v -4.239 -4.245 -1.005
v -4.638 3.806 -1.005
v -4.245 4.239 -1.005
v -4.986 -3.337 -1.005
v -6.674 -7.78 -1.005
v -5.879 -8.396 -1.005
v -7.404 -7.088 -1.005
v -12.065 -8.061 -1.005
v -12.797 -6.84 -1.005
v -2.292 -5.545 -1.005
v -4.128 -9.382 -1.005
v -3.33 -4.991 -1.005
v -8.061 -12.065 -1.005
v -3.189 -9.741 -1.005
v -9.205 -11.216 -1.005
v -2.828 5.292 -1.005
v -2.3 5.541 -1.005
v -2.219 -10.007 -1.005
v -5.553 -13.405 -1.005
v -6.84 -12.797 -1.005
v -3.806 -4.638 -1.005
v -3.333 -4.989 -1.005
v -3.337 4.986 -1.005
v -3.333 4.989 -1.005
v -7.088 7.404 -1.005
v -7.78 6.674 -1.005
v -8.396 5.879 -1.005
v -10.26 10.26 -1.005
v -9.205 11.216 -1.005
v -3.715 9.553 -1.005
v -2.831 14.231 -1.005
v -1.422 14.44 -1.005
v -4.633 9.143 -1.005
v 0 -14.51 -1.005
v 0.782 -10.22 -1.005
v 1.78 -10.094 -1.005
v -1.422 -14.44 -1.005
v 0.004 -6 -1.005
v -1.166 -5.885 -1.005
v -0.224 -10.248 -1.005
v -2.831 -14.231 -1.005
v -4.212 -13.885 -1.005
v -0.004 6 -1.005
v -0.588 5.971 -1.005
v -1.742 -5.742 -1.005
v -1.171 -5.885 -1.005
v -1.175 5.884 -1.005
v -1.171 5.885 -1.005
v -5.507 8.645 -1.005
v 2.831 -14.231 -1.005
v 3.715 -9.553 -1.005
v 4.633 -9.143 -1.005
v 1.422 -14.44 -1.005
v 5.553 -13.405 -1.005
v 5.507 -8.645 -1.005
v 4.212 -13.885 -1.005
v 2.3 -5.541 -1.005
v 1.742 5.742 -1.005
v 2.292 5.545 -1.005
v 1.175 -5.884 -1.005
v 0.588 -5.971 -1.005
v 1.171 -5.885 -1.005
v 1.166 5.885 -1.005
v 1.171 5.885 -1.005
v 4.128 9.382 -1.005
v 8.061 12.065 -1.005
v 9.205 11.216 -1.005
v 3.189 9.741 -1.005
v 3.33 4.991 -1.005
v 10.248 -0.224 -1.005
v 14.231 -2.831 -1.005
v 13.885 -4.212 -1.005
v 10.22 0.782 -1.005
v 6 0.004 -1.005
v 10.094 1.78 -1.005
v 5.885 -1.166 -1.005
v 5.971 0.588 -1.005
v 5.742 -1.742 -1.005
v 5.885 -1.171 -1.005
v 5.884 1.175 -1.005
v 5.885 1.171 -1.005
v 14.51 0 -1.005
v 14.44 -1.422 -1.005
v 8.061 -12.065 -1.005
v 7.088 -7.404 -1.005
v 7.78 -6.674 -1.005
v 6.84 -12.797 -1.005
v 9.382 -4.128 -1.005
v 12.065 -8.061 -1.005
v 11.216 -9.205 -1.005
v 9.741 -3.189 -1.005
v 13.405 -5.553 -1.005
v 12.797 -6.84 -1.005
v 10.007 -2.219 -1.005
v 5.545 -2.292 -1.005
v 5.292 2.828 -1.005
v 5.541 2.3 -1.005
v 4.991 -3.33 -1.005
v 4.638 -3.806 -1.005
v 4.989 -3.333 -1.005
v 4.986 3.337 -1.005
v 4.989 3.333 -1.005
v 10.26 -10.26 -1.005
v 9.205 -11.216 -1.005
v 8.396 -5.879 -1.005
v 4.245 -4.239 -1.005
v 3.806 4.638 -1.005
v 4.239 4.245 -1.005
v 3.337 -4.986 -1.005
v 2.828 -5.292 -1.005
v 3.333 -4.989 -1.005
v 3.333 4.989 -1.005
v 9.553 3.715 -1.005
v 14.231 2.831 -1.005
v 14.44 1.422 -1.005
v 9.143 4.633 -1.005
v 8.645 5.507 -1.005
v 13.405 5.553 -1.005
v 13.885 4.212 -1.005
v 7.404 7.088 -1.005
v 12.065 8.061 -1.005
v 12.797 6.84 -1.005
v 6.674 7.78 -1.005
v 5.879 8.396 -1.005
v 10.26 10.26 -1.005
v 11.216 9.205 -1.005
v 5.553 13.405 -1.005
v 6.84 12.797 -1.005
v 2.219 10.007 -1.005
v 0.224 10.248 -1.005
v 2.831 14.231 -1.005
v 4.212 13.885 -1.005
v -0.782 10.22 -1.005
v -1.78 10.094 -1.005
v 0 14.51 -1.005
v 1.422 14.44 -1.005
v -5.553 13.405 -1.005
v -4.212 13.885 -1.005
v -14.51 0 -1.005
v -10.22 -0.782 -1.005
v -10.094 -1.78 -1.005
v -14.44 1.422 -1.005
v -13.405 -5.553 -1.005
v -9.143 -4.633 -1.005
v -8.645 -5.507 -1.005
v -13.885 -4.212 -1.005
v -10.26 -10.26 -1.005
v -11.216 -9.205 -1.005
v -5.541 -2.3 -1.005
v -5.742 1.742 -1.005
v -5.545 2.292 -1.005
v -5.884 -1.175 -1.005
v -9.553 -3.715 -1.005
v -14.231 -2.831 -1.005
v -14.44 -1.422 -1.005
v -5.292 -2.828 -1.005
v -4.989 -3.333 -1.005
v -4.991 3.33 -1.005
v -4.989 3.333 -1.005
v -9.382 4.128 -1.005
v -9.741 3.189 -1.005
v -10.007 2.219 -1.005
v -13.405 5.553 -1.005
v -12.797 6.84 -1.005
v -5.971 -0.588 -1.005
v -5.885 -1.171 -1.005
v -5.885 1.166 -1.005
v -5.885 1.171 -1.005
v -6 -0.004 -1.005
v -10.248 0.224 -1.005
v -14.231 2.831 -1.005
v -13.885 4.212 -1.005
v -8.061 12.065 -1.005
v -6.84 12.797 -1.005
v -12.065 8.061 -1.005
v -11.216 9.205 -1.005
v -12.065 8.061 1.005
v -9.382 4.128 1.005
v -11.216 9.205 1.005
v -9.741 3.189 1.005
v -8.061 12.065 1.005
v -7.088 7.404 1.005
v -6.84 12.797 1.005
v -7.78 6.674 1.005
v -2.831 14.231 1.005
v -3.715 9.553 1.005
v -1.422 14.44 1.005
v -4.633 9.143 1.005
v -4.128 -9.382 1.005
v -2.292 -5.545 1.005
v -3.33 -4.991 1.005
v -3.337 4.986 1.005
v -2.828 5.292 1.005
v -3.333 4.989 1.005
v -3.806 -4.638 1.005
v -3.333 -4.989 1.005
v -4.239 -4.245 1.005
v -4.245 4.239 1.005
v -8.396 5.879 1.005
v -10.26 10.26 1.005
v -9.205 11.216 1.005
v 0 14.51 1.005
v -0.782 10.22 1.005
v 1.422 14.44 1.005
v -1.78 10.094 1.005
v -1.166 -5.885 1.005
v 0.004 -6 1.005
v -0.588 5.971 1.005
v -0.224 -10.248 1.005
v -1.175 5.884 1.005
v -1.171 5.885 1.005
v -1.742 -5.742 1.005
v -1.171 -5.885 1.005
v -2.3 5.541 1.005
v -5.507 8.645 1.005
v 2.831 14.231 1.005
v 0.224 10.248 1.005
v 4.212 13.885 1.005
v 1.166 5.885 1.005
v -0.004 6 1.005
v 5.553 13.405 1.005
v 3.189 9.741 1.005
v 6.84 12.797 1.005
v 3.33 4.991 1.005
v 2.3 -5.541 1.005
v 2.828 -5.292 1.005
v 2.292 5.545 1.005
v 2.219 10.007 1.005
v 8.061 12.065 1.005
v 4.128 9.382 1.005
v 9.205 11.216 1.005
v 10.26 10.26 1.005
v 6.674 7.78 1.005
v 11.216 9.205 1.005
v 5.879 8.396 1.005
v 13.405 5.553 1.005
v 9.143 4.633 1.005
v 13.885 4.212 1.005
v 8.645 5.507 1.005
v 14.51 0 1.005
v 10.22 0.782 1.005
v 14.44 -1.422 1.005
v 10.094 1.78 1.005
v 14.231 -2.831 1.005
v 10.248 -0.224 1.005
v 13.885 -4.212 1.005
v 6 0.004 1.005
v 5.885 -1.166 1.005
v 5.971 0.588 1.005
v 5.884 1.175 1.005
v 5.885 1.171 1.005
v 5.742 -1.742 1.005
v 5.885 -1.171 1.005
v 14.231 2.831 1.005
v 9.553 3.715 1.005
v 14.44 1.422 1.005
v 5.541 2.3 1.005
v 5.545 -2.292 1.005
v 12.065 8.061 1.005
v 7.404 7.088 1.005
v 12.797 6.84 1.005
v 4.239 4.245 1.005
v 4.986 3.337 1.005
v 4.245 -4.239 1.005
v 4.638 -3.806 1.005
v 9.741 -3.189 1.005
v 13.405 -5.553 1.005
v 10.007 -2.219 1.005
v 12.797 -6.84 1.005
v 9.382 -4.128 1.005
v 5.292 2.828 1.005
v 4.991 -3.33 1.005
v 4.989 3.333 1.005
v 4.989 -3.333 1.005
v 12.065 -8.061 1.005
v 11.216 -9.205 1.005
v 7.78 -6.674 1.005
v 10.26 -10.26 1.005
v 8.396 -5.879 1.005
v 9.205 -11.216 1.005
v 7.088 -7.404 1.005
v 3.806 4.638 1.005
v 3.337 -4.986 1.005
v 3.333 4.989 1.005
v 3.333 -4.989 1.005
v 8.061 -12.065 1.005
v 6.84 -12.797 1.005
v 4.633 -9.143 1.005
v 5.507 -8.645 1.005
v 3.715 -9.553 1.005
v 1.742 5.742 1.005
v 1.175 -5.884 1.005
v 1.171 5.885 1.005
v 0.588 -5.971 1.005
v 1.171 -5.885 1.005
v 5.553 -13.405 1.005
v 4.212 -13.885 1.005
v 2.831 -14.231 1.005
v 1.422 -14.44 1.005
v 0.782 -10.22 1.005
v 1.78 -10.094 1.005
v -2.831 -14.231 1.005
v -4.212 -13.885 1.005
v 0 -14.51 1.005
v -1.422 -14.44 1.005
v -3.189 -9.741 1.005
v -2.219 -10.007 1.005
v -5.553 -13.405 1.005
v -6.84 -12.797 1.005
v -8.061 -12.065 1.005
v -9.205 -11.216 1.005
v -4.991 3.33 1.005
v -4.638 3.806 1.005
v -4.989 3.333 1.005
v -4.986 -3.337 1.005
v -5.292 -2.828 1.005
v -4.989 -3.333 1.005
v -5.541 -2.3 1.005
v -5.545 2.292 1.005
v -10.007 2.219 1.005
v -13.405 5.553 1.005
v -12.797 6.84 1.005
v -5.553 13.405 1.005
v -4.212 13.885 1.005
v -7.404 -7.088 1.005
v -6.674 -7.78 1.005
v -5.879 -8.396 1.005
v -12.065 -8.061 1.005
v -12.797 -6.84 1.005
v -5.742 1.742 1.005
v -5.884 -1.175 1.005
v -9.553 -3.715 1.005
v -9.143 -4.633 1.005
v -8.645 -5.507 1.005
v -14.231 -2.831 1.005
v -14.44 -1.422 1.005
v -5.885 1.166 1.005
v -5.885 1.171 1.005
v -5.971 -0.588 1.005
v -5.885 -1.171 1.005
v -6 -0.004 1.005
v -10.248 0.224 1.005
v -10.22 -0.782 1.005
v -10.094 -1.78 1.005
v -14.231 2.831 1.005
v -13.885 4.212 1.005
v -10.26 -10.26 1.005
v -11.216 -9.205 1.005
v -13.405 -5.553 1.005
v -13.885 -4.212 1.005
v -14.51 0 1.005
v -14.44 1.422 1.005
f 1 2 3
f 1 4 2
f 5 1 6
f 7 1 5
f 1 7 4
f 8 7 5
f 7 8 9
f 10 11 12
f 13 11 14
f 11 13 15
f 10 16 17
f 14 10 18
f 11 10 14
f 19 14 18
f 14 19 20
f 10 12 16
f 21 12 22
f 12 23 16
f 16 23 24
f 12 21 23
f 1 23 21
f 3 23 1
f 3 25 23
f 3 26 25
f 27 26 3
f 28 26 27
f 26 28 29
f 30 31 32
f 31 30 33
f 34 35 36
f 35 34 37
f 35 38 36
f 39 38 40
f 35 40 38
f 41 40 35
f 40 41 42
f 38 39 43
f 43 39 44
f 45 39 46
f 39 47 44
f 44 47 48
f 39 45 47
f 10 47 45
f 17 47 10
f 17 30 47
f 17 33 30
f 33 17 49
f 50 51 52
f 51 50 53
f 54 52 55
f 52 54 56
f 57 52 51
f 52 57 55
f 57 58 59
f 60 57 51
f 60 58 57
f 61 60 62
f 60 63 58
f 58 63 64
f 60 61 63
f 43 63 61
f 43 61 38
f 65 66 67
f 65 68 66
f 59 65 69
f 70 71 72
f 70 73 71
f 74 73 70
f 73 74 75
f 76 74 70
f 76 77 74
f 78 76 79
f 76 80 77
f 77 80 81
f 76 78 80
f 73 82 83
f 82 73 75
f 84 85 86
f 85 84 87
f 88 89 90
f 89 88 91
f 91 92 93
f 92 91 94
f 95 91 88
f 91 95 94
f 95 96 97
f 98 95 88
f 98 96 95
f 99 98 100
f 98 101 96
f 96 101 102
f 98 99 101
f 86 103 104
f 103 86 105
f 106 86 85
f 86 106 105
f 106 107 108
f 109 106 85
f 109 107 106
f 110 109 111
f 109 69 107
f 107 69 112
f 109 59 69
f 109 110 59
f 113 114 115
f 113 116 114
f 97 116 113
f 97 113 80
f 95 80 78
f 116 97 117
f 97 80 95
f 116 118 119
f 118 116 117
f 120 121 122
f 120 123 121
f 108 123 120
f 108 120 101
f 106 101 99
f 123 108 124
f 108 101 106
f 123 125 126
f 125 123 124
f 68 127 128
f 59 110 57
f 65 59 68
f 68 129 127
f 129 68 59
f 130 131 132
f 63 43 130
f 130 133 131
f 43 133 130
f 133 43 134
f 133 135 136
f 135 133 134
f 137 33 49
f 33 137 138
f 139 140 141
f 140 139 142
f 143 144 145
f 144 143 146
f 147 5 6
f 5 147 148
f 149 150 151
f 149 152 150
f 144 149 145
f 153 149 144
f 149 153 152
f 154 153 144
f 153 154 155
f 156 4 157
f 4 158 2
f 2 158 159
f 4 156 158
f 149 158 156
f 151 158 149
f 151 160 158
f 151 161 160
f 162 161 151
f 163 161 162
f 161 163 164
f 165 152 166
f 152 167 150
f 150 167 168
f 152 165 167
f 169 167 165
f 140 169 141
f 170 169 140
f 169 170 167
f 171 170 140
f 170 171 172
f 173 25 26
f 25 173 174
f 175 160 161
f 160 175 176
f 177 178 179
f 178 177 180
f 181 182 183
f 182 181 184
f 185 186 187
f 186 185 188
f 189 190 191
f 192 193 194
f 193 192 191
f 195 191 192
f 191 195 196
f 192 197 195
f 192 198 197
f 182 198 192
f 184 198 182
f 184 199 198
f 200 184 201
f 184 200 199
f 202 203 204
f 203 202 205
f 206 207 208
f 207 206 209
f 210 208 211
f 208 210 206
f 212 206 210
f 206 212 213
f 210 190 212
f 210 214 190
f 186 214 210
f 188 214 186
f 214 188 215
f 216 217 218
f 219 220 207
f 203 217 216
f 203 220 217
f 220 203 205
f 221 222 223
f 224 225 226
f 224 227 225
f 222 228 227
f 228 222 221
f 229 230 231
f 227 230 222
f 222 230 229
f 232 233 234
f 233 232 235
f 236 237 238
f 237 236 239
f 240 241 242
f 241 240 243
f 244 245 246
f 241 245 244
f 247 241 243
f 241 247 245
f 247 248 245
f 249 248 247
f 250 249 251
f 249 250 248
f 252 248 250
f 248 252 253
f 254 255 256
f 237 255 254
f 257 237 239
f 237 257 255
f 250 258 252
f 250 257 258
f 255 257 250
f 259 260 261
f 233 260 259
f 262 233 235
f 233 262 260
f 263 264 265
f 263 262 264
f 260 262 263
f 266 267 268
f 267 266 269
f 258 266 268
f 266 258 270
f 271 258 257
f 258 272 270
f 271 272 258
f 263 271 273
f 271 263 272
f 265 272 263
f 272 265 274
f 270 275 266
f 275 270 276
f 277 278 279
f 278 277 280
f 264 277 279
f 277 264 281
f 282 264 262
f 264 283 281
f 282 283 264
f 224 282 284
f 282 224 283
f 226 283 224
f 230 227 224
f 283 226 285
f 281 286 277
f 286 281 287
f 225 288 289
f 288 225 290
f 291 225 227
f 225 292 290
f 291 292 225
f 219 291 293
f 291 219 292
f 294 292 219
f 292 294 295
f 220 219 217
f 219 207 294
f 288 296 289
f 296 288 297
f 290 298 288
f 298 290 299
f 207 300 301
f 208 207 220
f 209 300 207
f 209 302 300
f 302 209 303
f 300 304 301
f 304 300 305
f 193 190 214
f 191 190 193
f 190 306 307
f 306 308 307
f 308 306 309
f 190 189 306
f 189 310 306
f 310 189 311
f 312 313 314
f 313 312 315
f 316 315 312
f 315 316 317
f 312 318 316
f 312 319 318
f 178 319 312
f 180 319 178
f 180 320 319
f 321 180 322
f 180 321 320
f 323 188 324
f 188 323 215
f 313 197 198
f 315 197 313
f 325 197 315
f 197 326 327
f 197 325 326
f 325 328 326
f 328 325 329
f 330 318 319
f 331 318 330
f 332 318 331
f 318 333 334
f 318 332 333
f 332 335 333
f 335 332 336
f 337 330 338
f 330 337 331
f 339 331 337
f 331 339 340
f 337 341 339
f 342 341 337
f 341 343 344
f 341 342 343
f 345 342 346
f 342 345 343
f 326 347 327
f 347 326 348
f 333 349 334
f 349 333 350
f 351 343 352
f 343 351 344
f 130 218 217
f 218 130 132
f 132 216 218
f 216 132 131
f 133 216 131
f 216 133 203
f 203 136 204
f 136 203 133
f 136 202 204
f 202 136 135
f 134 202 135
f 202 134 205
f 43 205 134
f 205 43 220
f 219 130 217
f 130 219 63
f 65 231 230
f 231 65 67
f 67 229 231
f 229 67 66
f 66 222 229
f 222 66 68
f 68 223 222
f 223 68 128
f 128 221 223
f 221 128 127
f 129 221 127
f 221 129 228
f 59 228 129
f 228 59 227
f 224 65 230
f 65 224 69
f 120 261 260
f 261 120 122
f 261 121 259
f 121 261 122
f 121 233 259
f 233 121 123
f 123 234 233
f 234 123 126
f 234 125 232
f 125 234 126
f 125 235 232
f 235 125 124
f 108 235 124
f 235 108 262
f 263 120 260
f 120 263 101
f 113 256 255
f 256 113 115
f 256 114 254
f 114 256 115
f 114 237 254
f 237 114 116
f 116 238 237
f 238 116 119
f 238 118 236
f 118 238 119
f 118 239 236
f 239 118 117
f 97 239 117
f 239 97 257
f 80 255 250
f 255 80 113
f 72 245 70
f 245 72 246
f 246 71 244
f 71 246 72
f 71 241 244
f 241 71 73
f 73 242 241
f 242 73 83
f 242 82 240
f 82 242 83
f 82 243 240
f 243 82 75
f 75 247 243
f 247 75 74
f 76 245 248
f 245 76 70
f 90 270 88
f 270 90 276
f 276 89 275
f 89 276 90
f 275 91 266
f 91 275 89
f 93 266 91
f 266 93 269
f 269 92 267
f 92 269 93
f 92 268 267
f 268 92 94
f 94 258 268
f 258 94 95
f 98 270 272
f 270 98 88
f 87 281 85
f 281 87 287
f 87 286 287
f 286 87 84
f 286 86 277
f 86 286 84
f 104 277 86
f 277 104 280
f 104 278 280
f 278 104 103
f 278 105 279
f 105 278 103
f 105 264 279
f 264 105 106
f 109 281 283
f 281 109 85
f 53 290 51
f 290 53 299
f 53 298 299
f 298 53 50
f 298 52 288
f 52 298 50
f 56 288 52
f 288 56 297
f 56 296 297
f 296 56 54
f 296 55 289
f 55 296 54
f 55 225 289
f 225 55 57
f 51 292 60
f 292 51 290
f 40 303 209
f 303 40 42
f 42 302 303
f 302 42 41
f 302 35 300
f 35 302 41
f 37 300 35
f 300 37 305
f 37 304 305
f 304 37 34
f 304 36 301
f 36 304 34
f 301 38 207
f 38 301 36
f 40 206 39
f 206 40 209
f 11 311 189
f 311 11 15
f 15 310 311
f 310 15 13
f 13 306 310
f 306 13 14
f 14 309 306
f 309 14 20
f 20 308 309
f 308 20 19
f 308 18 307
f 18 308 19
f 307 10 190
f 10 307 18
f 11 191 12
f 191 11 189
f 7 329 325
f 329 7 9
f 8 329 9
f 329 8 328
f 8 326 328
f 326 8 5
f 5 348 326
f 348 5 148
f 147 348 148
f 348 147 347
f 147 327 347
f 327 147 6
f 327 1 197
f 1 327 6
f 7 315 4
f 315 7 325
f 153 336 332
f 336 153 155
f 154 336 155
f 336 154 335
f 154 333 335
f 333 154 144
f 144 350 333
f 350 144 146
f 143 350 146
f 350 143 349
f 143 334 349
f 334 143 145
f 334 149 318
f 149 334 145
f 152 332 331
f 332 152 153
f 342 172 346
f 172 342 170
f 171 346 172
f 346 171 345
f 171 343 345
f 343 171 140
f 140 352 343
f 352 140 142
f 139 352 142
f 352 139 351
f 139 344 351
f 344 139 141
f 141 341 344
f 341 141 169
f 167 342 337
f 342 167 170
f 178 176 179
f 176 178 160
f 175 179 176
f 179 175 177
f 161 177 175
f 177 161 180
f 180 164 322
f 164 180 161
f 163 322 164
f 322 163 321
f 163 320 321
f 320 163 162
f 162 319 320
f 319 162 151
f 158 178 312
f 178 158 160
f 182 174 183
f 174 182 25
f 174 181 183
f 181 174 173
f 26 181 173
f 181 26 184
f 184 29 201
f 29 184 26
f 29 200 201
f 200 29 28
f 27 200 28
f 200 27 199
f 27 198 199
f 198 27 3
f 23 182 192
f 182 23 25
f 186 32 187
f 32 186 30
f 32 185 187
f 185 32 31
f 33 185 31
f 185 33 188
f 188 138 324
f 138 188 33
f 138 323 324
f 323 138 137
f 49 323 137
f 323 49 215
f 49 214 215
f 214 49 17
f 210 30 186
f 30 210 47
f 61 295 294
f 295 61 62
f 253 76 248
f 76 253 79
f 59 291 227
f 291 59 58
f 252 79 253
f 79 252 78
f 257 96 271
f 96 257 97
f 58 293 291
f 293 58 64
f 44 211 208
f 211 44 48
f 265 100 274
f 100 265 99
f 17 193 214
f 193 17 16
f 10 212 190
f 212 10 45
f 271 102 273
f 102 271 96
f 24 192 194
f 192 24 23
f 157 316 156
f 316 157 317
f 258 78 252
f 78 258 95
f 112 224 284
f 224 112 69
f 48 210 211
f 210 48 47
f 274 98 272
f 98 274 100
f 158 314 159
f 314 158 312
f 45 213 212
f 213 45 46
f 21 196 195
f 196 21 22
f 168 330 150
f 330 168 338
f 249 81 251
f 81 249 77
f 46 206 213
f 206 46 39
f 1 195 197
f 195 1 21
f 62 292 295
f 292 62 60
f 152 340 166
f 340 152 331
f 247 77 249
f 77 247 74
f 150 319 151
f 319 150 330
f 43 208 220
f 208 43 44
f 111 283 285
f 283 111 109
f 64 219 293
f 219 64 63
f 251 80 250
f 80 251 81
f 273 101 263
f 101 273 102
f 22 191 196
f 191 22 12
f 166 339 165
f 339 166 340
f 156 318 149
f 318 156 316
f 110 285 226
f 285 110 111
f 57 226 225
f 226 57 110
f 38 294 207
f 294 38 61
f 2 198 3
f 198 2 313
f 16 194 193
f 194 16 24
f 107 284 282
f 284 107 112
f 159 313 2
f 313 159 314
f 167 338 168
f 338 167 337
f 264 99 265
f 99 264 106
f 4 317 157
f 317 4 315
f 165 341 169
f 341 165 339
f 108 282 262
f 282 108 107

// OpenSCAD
// Start: lazy_union
default_5_default_5();
// End: lazy_union

// Modules.

// 'PartMaterial undef-default - default 5.0'
module default_5_default_5() {
  // 'None : _combine_solids_and_holes'
  union() {
    // 'as_cutout : _combine_solids_and_holes'
    union() {
      // ('spoke', 0)
      multmatrix(m=[[1.0, 0.0, 0.0, 0.0], [0.0, 1.0, 0.0, 0.0], [0.0, 0.0, 1.0, -1.005], [0.0, 0.0, 0.0, 1.0]]) {
        // "('spoke', 0) : _combine_solids_and_holes"
        union() {
          // ('spoke', 0)
          linear_extrude(height=2.01, twist=0.0, slices=4, scale=[1.0, 1.0]) {
            polygon(points=[[0.0, 5.99], [-1.779893821086036, 10.094279468375133], [0.0, 14.51], [1.4222287061819243, 14.440130384013576], [-0.7819107386655111, 10.220132856120783], [2.830760572454021, 14.231194418650873], [4.2120306669622485, 13.88520427147435], [0.22360257160425148, 10.247560777569069], [1.1685910288766082, 5.87490382961535]]);
          }
        }
      }
      // ('spoke', 1)
      multmatrix(m=[[0.9238795325112867, 0.38268343236508984, 0.0, 0.0], [-0.3826834323650898, 0.9238795325112867, 0.0, 0.0], [0.0, 0.0, 1.0, -1.005], [0.0, 0.0, 0.0, 1.0]]) {
        // "('spoke', 1) : _combine_solids_and_holes"
        union() {
          // ('spoke', 1)
          linear_extrude(height=2.01, twist=0.0, slices=4, scale=[1.0, 1.0]) {
            polygon(points=[[0.0, 5.99], [-1.779893821086036, 10.094279468375133], [0.0, 14.51], [1.4222287061819243, 14.440130384013576], [-0.7819107386655111, 10.220132856120783], [2.830760572454021, 14.231194418650873], [4.2120306669622485, 13.88520427147435], [0.22360257160425148, 10.247560777569069], [1.1685910288766082, 5.87490382961535]]);
          }
        }
      }
      // ('spoke', 2)
      multmatrix(m=[[0.7071067811865475, 0.7071067811865475, 0.0, 0.0], [-0.7071067811865475, 0.7071067811865475, 0.0, 0.0], [0.0, 0.0, 1.0, -1.005], [0.0, 0.0, 0.0, 1.0]]) {
        // "('spoke', 2) : _combine_solids_and_holes"
        union() {
          // ('spoke', 2)
          linear_extrude(height=2.01, twist=0.0, slices=4, scale=[1.0, 1.0]) {
            polygon(points=[[0.0, 5.99], [-1.779893821086036, 10.094279468375133], [0.0, 14.51], [1.4222287061819243, 14.440130384013576], [-0.7819107386655111, 10.220132856120783], [2.830760572454021, 14.231194418650873], [4.2120306669622485, 13.88520427147435], [0.22360257160425148, 10.247560777569069], [1.1685910288766082, 5.87490382961535]]);
          }
        }
      }
      // ('spoke', 3)
      multmatrix(m=[[0.3826834323650899, 0.9238795325112867, 0.0, 0.0], [-0.9238795325112867, 0.38268343236508984, 0.0, 0.0], [0.0, 0.0, 1.0, -1.005], [0.0, 0.0, 0.0, 1.0]]) {
        // "('spoke', 3) : _combine_solids_and_holes"
        union() {
          // ('spoke', 3)
          linear_extrude(height=2.01, twist=0.0, slices=4, scale=[1.0, 1.0]) {
            polygon(points=[[0.0, 5.99], [-1.779893821086036, 10.094279468375133], [0.0, 14.51], [1.4222287061819243, 14.440130384013576], [-0.7819107386655111, 10.220132856120783], [2.830760572454021, 14.231194418650873], [4.2120306669622485, 13.88520427147435], [0.22360257160425148, 10.247560777569069], [1.1685910288766082, 5.87490382961535]]);
          }
        }
      }
      // ('spoke', 4)
      multmatrix(m=[[0.0, 1.0, 0.0, 0.0], [-1.0, 0.0, 0.0, 0.0], [0.0, 0.0, 1.0, -1.005], [0.0, 0.0, 0.0, 1.0]]) {
        // "('spoke', 4) : _combine_solids_and_holes"
        union() {
          // ('spoke', 4)
          linear_extrude(height=2.01, twist=0.0, slices=4, scale=[1.0, 1.0]) {
            polygon(points=[[0.0, 5.99], [-1.779893821086036, 10.094279468375133], [0.0, 14.51], [1.4222287061819243, 14.440130384013576], [-0.7819107386655111, 10.220132856120783], [2.830760572454021, 14.231194418650873], [4.2120306669622485, 13.88520427147435], [0.22360257160425148, 10.247560777569069], [1.1685910288766082, 5.87490382961535]]);
          }
        }
      }
      // ('spoke', 5)
      multmatrix(m=[[-0.3826834323650898, 0.9238795325112867, 0.0, 0.0], [-0.9238795325112868, -0.3826834323650898, 0.0, 0.0], [0.0, 0.0, 1.0, -1.005], [0.0, 0.0, 0.0, 1.0]]) {
        // "('spoke', 5) : _combine_solids_and_holes"
        union() {
          // ('spoke', 5)
          linear_extrude(height=2.01, twist=0.0, slices=4, scale=[1.0, 1.0]) {
            polygon(points=[[0.0, 5.99], [-1.779893821086036, 10.094279468375133], [0.0, 14.51], [1.4222287061819243, 14.440130384013576], [-0.7819107386655111, 10.220132856120783], [2.830760572454021, 14.231194418650873], [4.2120306669622485, 13.88520427147435], [0.22360257160425148, 10.247560777569069], [1.1685910288766082, 5.87490382961535]]);
          }
        }
      }
      // ('spoke', 6)
      multmatrix(m=[[-0.7071067811865475, 0.7071067811865476, 0.0, 0.0], [-0.7071067811865476, -0.7071067811865475, 0.0, 0.0], [0.0, 0.0, 1.0, -1.005], [0.0, 0.0, 0.0, 1.0]]) {
        // "('spoke', 6) : _combine_solids_and_holes"
        union() {
          // ('spoke', 6)
          linear_extrude(height=2.01, twist=0.0, slices=4, scale=[1.0, 1.0]) {
            polygon(points=[[0.0, 5.99], [-1.779893821086036, 10.094279468375133], [0.0, 14.51], [1.4222287061819243, 14.440130384013576], [-0.7819107386655111, 10.220132856120783], [2.830760572454021, 14.231194418650873], [4.2120306669622485, 13.88520427147435], [0.22360257160425148, 10.247560777569069], [1.1685910288766082, 5.87490382961535]]);
          }
        }
      }
      // ('spoke', 7)
      multmatrix(m=[[-0.9238795325112867, 0.3826834323650899, 0.0, 0.0], [-0.3826834323650899, -0.9238795325112867, 0.0, 0.0], [0.0, 0.0, 1.0, -1.005], [0.0, 0.0, 0.0, 1.0]]) {
        // "('spoke', 7) : _combine_solids_and_holes"
        union() {
          // ('spoke', 7)
          linear_extrude(height=2.01, twist=0.0, slices=4, scale=[1.0, 1.0]) {
            polygon(points=[[0.0, 5.99], [-1.779893821086036, 10.094279468375133], [0.0, 14.51], [1.4222287061819243, 14.440130384013576], [-0.7819107386655111, 10.220132856120783], [2.830760572454021, 14.231194418650873], [4.2120306669622485, 13.88520427147435], [0.22360257160425148, 10.247560777569069], [1.1685910288766082, 5.87490382961535]]);
          }
        }
      }
      // ('spoke', 8)
      multmatrix(m=[[-1.0, 0.0, 0.0, 0.0], [0.0, -1.0, 0.0, 0.0], [0.0, 0.0, 1.0, -1.005], [0.0, 0.0, 0.0, 1.0]]) {
        // "('spoke', 8) : _combine_solids_and_holes"
        union() {
          // ('spoke', 8)
          linear_extrude(height=2.01, twist=0.0, slices=4, scale=[1.0, 1.0]) {
            polygon(points=[[0.0, 5.99], [-1.779893821086036, 10.094279468375133], [0.0, 14.51], [1.4222287061819243, 14.440130384013576], [-0.7819107386655111, 10.220132856120783], [2.830760572454021, 14.231194418650873], [4.2120306669622485, 13.88520427147435], [0.22360257160425148, 10.247560777569069], [1.1685910288766082, 5.87490382961535]]);
          }
        }
      }
      // ('spoke', 9)
      multmatrix(m=[[-0.9238795325112871, -0.38268343236508917, 0.0, 0.0], [0.38268343236508917, -0.9238795325112868, 0.0, 0.0], [0.0, 0.0, 1.0, -1.005], [0.0, 0.0, 0.0, 1.0]]) {
        // "('spoke', 9) : _combine_solids_and_holes"
        union() {
          // ('spoke', 9)
          linear_extrude(height=2.01, twist=0.0, slices=4, scale=[1.0, 1.0]) {
            polygon(points=[[0.0, 5.99], [-1.779893821086036, 10.094279468375133], [0.0, 14.51], [1.4222287061819243, 14.440130384013576], [-0.7819107386655111, 10.220132856120783], [2.830760572454021, 14.231194418650873], [4.2120306669622485, 13.88520427147435], [0.22360257160425148, 10.247560777569069], [1.1685910288766082, 5.87490382961535]]);
          }
        }
      }
      // ('spoke', 10)
      multmatrix(m=[[-0.7071067811865477, -0.7071067811865474, 0.0, 0.0], [0.7071067811865474, -0.7071067811865476, 0.0, 0.0], [0.0, 0.0, 1.0, -1.005], [0.0, 0.0, 0.0, 1.0]]) {
        // "('spoke', 10) : _combine_solids_and_holes"
        union() {
          // ('spoke', 10)
          linear_extrude(height=2.01, twist=0.0, slices=4, scale=[1.0, 1.0]) {
            polygon(points=[[0.0, 5.99], [-1.779893821086036, 10.094279468375133], [0.0, 14.51], [1.4222287061819243, 14.440130384013576], [-0.7819107386655111, 10.220132856120783], [2.830760572454021, 14.231194418650873], [4.2120306669622485, 13.88520427147435], [0.22360257160425148, 10.247560777569069], [1.1685910288766082, 5.87490382961535]]);
          }
        }
      }
      // ('spoke', 11)
      multmatrix(m=[[-0.3826834323650895, -0.9238795325112868, 0.0, 0.0], [0.9238795325112868, -0.3826834323650895, 0.0, 0.0], [0.0, 0.0, 1.0, -1.005], [0.0, 0.0, 0.0, 1.0]]) {
        // "('spoke', 11) : _combine_solids_and_holes"
        union() {
          // ('spoke', 11)
          linear_extrude(height=2.01, twist=0.0, slices=4, scale=[1.0, 1.0]) {
            polygon(points=[[0.0, 5.99], [-1.779893821086036, 10.094279468375133], [0.0, 14.51], [1.4222287061819243, 14.440130384013576], [-0.7819107386655111, 10.220132856120783], [2.830760572454021, 14.231194418650873], [4.2120306669622485, 13.88520427147435], [0.22360257160425148, 10.247560777569069], [1.1685910288766082, 5.87490382961535]]);
          }
        }
      }
      // ('spoke', 12)
      multmatrix(m=[[0.0, -1.0, 0.0, 0.0], [1.0, 0.0, 0.0, 0.0], [0.0, 0.0, 1.0, -1.005], [0.0, 0.0, 0.0, 1.0]]) {
        // "('spoke', 12) : _combine_solids_and_holes"
        union() {
          // ('spoke', 12)
          linear_extrude(height=2.01, twist=0.0, slices=4, scale=[1.0, 1.0]) {
            polygon(points=[[0.0, 5.99], [-1.779893821086036, 10.094279468375133], [0.0, 14.51], [1.4222287061819243, 14.440130384013576], [-0.7819107386655111, 10.220132856120783], [2.830760572454021, 14.231194418650873], [4.2120306669622485, 13.88520427147435], [0.22360257160425148, 10.247560777569069], [1.1685910288766082, 5.87490382961535]]);
          }
        }
      }
      // ('spoke', 13)
      multmatrix(m=[[0.38268343236509, -0.9238795325112866, 0.0, 0.0], [0.9238795325112867, 0.38268343236509, 0.0, 0.0], [0.0, 0.0, 1.0, -1.005], [0.0, 0.0, 0.0, 1.0]]) {
        // "('spoke', 13) : _combine_solids_and_holes"
        union() {
          // ('spoke', 13)
          linear_extrude(height=2.01, twist=0.0, slices=4, scale=[1.0, 1.0]) {
            polygon(points=[[0.0, 5.99], [-1.779893821086036, 10.094279468375133], [0.0, 14.51], [1.4222287061819243, 14.440130384013576], [-0.7819107386655111, 10.220132856120783], [2.830760572454021, 14.231194418650873], [4.2120306669622485, 13.88520427147435], [0.22360257160425148, 10.247560777569069], [1.1685910288766082, 5.87490382961535]]);
          }
        }
      }
      // ('spoke', 14)
      multmatrix(m=[[0.7071067811865474, -0.7071067811865477, 0.0, 0.0], [0.7071067811865477, 0.7071067811865474, 0.0, 0.0], [0.0, 0.0, 1.0, -1.005], [0.0, 0.0, 0.0, 1.0]]) {
        // "('spoke', 14) : _combine_solids_and_holes"
        union() {
          // ('spoke', 14)
          linear_extrude(height=2.01, twist=0.0, slices=4, scale=[1.0, 1.0]) {
            polygon(points=[[0.0, 5.99], [-1.779893821086036, 10.094279468375133], [0.0, 14.51], [1.4222287061819243, 14.440130384013576], [-0.7819107386655111, 10.220132856120783], [2.830760572454021, 14.231194418650873], [4.2120306669622485, 13.88520427147435], [0.22360257160425148, 10.247560777569069], [1.1685910288766082, 5.87490382961535]]);
          }
        }
      }
      // ('spoke', 15)
      multmatrix(m=[[0.9238795325112868, -0.38268343236508956, 0.0, 0.0], [0.38268343236508956, 0.9238795325112868, 0.0, 0.0], [0.0, 0.0, 1.0, -1.005], [0.0, 0.0, 0.0, 1.0]]) {
        // "('spoke', 15) : _combine_solids_and_holes"
        union() {
          // ('spoke', 15)
          linear_extrude(height=2.01, twist=0.0, slices=4, scale=[1.0, 1.0]) {
            polygon(points=[[0.0, 5.99], [-1.779893821086036, 10.094279468375133], [0.0, 14.51], [1.4222287061819243, 14.440130384013576], [-0.7819107386655111, 10.220132856120783], [2.830760572454021, 14.231194418650873], [4.2120306669622485, 13.88520427147435], [0.22360257160425148, 10.247560777569069], [1.1685910288766082, 5.87490382961535]]);
          }
        }
      }
      // 'inner_core'
      multmatrix(m=[[1.0, 0.0, 0.0, 0.0], [0.0, -1.0, 0.0, 0.0], [0.0, 0.0, -1.0, 1.005], [0.0, 0.0, 0.0, 1.0]]) {
        // 'inner_core : _combine_solids_and_holes'
        union() {
          // 'inner_core'
          cylinder(h=2.01, r1=6.0, r2=6.0, center=false, $fn=64);
        }
      }
    }
  }
} // end module default_5_default_5
